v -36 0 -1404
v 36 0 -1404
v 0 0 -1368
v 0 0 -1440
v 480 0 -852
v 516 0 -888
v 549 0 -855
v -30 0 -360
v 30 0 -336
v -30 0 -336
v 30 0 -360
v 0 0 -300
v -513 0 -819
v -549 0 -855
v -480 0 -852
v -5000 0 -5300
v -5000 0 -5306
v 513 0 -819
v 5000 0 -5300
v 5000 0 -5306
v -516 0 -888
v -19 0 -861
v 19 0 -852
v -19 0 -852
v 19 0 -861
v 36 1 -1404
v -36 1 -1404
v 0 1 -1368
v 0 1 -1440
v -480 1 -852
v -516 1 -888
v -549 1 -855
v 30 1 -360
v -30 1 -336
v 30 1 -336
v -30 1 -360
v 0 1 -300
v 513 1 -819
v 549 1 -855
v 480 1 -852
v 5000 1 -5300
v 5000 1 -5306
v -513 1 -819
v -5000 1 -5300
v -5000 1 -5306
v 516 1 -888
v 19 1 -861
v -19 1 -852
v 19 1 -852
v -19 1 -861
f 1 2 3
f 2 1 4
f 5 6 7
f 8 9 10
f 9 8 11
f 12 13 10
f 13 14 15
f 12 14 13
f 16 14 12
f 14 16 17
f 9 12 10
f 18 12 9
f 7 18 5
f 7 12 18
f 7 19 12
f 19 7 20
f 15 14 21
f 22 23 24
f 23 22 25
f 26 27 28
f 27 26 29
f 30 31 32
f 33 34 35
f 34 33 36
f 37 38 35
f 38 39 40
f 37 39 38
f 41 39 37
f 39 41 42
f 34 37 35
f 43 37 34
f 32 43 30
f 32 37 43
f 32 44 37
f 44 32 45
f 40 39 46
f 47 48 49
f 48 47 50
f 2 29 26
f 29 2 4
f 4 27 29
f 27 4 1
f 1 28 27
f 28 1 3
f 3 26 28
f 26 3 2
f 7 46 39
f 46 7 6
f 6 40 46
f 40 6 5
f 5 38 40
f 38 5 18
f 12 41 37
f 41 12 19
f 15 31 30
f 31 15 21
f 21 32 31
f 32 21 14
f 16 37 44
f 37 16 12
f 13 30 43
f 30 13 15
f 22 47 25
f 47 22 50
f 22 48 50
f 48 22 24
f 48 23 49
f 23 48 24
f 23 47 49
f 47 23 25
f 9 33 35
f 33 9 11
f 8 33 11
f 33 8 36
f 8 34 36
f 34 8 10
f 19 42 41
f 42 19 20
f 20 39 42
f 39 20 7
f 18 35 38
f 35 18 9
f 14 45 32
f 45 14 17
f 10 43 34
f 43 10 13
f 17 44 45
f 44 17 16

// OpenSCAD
$fs = 120;

$vpt = [0,1080,480];
$vpr = [-34,0,0];
$vpf = 45;

foul_line = 6;
plain_color = [1,1,1,0.8];
out_color = [1,0.75,0.75,0.8];
eat_color = [0.5,0.75,1,0.8];

// home, first, second, third, rubber
color([1,1,1]) scale([1,-1,-1]) rotate([90,0,0]) linear_extrude(1) {
    polygon([[-30,30*2+300],[30,30*2+300],[30,30+300],[0,300],[-30,30+300]]);
    polygon([[552-36*2,852],[552-36,852+36],[552,852],[552-36,852-36]]);
    polygon([[0,1404+36],[36,1404],[0,1404-36],[-36,1404]]);
    polygon([[-552+36*2,852],[-552+36,852+36],[-552,852],[-552+36,852-36]]);
    polygon([[-19,852],[19,852],[19,9+852],[-19,9+852]]);
}

// foul lines
color([1,1,1,0.5]) scale([1,-1,-1]) rotate([90,0,0]) linear_extrude(1) {
    polygon([[0,300],[-5000,300+5000],[-5000,300+5000+foul_line],[0,300+foul_line]]);
    polygon([[0,300],[5000,300+5000],[5000,300+5000+foul_line],[0,300+foul_line]]);
}

scale([0.1,0.1,-0.1]) translate([-23200,0,0]) {
    color(out_color) polyhedron([[12390,0,8700],[12400,0,8700],[12390,1350,8700],[12400,1350,8700]], [[0,1,3,2]]);
    color(out_color) polyhedron([[12390,0,8700],[12390,0,21700],[12390,1350,8700],[12390,1350,21700]], [[0,1,3,2]]);
    color(out_color) polyhedron([[12400,0,8700],[12400,0,21700],[12400,1350,8700],[12400,1350,21700]], [[0,1,3,2]]);
    color(out_color) polyhedron([[12390,0,21700],[12400,0,21700],[12390,1350,21700],[12400,1350,21700]], [[0,1,3,2]]);
    color(out_color) polyhedron([[12390,1350,8700],[12390,1350,21700],[12400,1350,8700],[12400,1350,21700]], [[0,1,3,2]]);
    color(out_color) polyhedron([[12400,0,21680],[22300,0,31450],[12400,1350,21680],[22300,1350,31450]], [[0,1,3,2]]);
    color(out_color) polyhedron([[12400,0,21680],[12400,0,21690],[12400,1350,21680],[12400,1350,21690]], [[0,1,3,2]]);
    color(out_color) polyhedron([[22300,0,31450],[22300,0,31460],[22300,1350,31450],[22300,1350,31460]], [[0,1,3,2]]);
    color(out_color) polyhedron([[12400,0,21690],[22300,0,31460],[12400,1350,21690],[22300,1350,31460]], [[0,1,3,2]]);
    color(out_color) polyhedron([[12400,1350,21680],[12400,1350,21690],[22300,1350,31450],[22300,1350,31460]], [[0,1,3,2]]);
    color(out_color) polyhedron([[14250,0,39418],[40000,0,13931],[14250,4150,39418],[40000,4150,13931]], [[0,1,3,2]]);
    color(out_color) polyhedron([[14250,0,39418],[14250,0,39428],[14250,4150,39418],[14250,4150,39428]], [[0,1,3,2]]);
    color(out_color) polyhedron([[40000,0,13931],[40000,0,13941],[40000,4150,13931],[40000,4150,13941]], [[0,1,3,2]]);
    color(out_color) polyhedron([[14250,0,39428],[40000,0,13941],[14250,4150,39428],[40000,4150,13941]], [[0,1,3,2]]);
    color(out_color) polyhedron([[14250,4150,39418],[14250,4150,39428],[40000,4150,13931],[40000,4150,13941]], [[0,1,3,2]]);
    color(out_color) polyhedron([[33700,0,25800],[42200,0,16660],[33700,1700,25800],[42200,1700,16660]], [[0,1,3,2]]);
    color(out_color) polyhedron([[33700,0,25800],[35700,0,28600],[33700,1700,25800],[35700,1700,28600]], [[0,1,3,2]]);
    color(out_color) polyhedron([[42200,0,16660],[42200,0,18610],[42200,1700,16660],[42200,1700,18610]], [[0,1,3,2]]);
    color(out_color) polyhedron([[35700,0,28600],[42200,0,18610],[35700,1700,28600],[42200,1700,18610]], [[0,1,3,2]]);
    color(out_color) polyhedron([[33700,1700,25800],[35700,1700,28600],[42200,1700,16660],[42200,1700,18610]], [[0,1,3,2]]);
    color(out_color) polyhedron([[24730,0,1930],[24731,0,1930],[24730,10,1930],[24731,10,1930]], [[0,1,3,2]]);
    color(out_color) polyhedron([[24730,0,1930],[36050,0,14510],[24730,10,1930],[36050,10,14510]], [[0,1,3,2]]);
    color(out_color) polyhedron([[24731,0,1930],[36051,0,14510],[24731,10,1930],[36051,10,14510]], [[0,1,3,2]]);
    color(out_color) polyhedron([[36050,0,14510],[36051,0,14510],[36050,10,14510],[36051,10,14510]], [[0,1,3,2]]);
    color(out_color) polyhedron([[24730,10,1930],[36050,10,14510],[24731,10,1930],[36051,10,14510]], [[0,1,3,2]]);
    color(out_color) polyhedron([[13960,0,4590],[18500,0,4590],[13960,5,4590],[18500,5,4590]], [[0,1,3,2]]);
    color(out_color) polyhedron([[13960,0,4590],[13960,0,4690],[13960,5,4590],[13960,5,4690]], [[0,1,3,2]]);
    color(out_color) polyhedron([[18500,0,4590],[18500,0,4690],[18500,5,4590],[18500,5,4690]], [[0,1,3,2]]);
    color(out_color) polyhedron([[13960,0,4690],[18500,0,4690],[13960,5,4690],[18500,5,4690]], [[0,1,3,2]]);
    color(out_color) polyhedron([[13960,5,4590],[13960,5,4690],[18500,5,4590],[18500,5,4690]], [[0,1,3,2]]);
    color(out_color) polyhedron([[19090,0,1880],[19190,0,1880],[19090,5,1880],[19190,5,1880]], [[0,1,3,2]]);
    color(out_color) polyhedron([[19090,0,1880],[18500,0,4560],[19090,5,1880],[18500,5,4560]], [[0,1,3,2]]);
    color(out_color) polyhedron([[19190,0,1880],[18600,0,4560],[19190,5,1880],[18600,5,4560]], [[0,1,3,2]]);
    color(out_color) polyhedron([[18500,0,4560],[18600,0,4560],[18500,5,4560],[18600,5,4560]], [[0,1,3,2]]);
    color(out_color) polyhedron([[19090,5,1880],[18500,5,4560],[19190,5,1880],[18600,5,4560]], [[0,1,3,2]]);
    color(plain_color) polyhedron([[0,0,0],[0,0,0],[0,0,0],[0,0,0]], [[0,1,3,2]]);
    color(plain_color) polyhedron([[0,0,0],[0,0,0],[0,0,0],[0,0,0]], [[0,1,3,2]]);
    color(plain_color) polyhedron([[0,0,0],[0,0,0],[0,0,0],[0,0,0]], [[0,1,3,2]]);
    color(plain_color) polyhedron([[0,0,0],[0,0,0],[0,0,0],[0,0,0]], [[0,1,3,2]]);
    color(plain_color) polyhedron([[0,0,0],[0,0,0],[0,0,0],[0,0,0]], [[0,1,3,2]]);
    color(plain_color) polyhedron([[0,0,0],[0,0,0],[0,0,0],[0,0,0]], [[0,1,3,2]]);
    color(plain_color) polyhedron([[0,0,0],[0,0,0],[0,0,0],[0,0,0]], [[0,1,3,2]]);
    color(plain_color) polyhedron([[0,0,0],[0,0,0],[0,0,0],[0,0,0]], [[0,1,3,2]]);
    color(plain_color) polyhedron([[0,0,0],[0,0,0],[0,0,0],[0,0,0]], [[0,1,3,2]]);
    color(plain_color) polyhedron([[0,0,0],[0,0,0],[0,0,0],[0,0,0]], [[0,1,3,2]]);
    color(plain_color) polyhedron([[0,0,0],[0,0,0],[0,0,0],[0,0,0]], [[0,1,3,2]]);
    color(plain_color) polyhedron([[0,0,0],[0,0,0],[0,0,0],[0,0,0]], [[0,1,3,2]]);
    color(plain_color) polyhedron([[0,0,0],[0,0,0],[0,0,0],[0,0,0]], [[0,1,3,2]]);
    color(plain_color) polyhedron([[0,0,0],[0,0,0],[0,0,0],[0,0,0]], [[0,1,3,2]]);
    color(plain_color) polyhedron([[0,0,0],[0,0,0],[0,0,0],[0,0,0]], [[0,1,3,2]]);
    color(plain_color) polyhedron([[0,0,0],[0,0,0],[0,0,0],[0,0,0]], [[0,1,3,2]]);
    color(plain_color) polyhedron([[0,0,0],[0,0,0],[0,0,0],[0,0,0]], [[0,1,3,2]]);
    color(plain_color) polyhedron([[0,0,0],[0,0,0],[0,0,0],[0,0,0]], [[0,1,3,2]]);
    color(plain_color) polyhedron([[0,0,0],[0,0,0],[0,0,0],[0,0,0]], [[0,1,3,2]]);
    color(plain_color) polyhedron([[0,0,0],[0,0,0],[0,0,0],[0,0,0]], [[0,1,3,2]]);
    color(plain_color) polyhedron([[0,0,0],[0,0,0],[0,0,0],[0,0,0]], [[0,1,3,2]]);
    color(plain_color) polyhedron([[0,0,0],[0,0,0],[0,0,0],[0,0,0]], [[0,1,3,2]]);
    color(plain_color) polyhedron([[0,0,0],[0,0,0],[0,0,0],[0,0,0]], [[0,1,3,2]]);
    color(plain_color) polyhedron([[0,0,0],[0,0,0],[0,0,0],[0,0,0]], [[0,1,3,2]]);
    color(plain_color) polyhedron([[0,0,0],[0,0,0],[0,0,0],[0,0,0]], [[0,1,3,2]]);
    color(plain_color) polyhedron([[0,0,0],[0,0,0],[0,0,0],[0,0,0]], [[0,1,3,2]]);
    color(plain_color) polyhedron([[0,0,0],[0,0,0],[0,0,0],[0,0,0]], [[0,1,3,2]]);
    color(plain_color) polyhedron([[0,0,0],[0,0,0],[0,0,0],[0,0,0]], [[0,1,3,2]]);
    color(plain_color) polyhedron([[0,0,0],[0,0,0],[0,0,0],[0,0,0]], [[0,1,3,2]]);
    color(plain_color) polyhedron([[0,0,0],[0,0,0],[0,0,0],[0,0,0]], [[0,1,3,2]]);
    color(plain_color) polyhedron([[0,0,0],[0,0,0],[0,0,0],[0,0,0]], [[0,1,3,2]]);
    color(plain_color) polyhedron([[0,0,0],[0,0,0],[0,0,0],[0,0,0]], [[0,1,3,2]]);
    color(plain_color) polyhedron([[0,0,0],[0,0,0],[0,0,0],[0,0,0]], [[0,1,3,2]]);
    color(plain_color) polyhedron([[0,0,0],[0,0,0],[0,0,0],[0,0,0]], [[0,1,3,2]]);
    color(plain_color) polyhedron([[0,0,0],[0,0,0],[0,0,0],[0,0,0]], [[0,1,3,2]]);
    color(plain_color) polyhedron([[0,0,0],[0,0,0],[0,0,0],[0,0,0]], [[0,1,3,2]]);
    color(plain_color) polyhedron([[0,0,0],[0,0,0],[0,0,0],[0,0,0]], [[0,1,3,2]]);
    color(plain_color) polyhedron([[0,0,0],[0,0,0],[0,0,0],[0,0,0]], [[0,1,3,2]]);
    color(plain_color) polyhedron([[0,0,0],[0,0,0],[0,0,0],[0,0,0]], [[0,1,3,2]]);
    color(plain_color) polyhedron([[0,0,0],[0,0,0],[0,0,0],[0,0,0]], [[0,1,3,2]]);
    color(plain_color) polyhedron([[0,0,0],[0,0,0],[0,0,0],[0,0,0]], [[0,1,3,2]]);
    color(plain_color) polyhedron([[0,0,0],[0,0,0],[0,0,0],[0,0,0]], [[0,1,3,2]]);
    color(plain_color) polyhedron([[0,0,0],[0,0,0],[0,0,0],[0,0,0]], [[0,1,3,2]]);
    color(plain_color) polyhedron([[0,0,0],[0,0,0],[0,0,0],[0,0,0]], [[0,1,3,2]]);
    color(plain_color) polyhedron([[0,0,0],[0,0,0],[0,0,0],[0,0,0]], [[0,1,3,2]]);
    color(plain_color) polyhedron([[0,0,0],[0,0,0],[0,0,0],[0,0,0]], [[0,1,3,2]]);
    color(plain_color) polyhedron([[0,0,0],[0,0,0],[0,0,0],[0,0,0]], [[0,1,3,2]]);
    color(plain_color) polyhedron([[0,0,0],[0,0,0],[0,0,0],[0,0,0]], [[0,1,3,2]]);
    color(plain_color) polyhedron([[0,0,0],[0,0,0],[0,0,0],[0,0,0]], [[0,1,3,2]]);
    color(plain_color) polyhedron([[0,0,0],[0,0,0],[0,0,0],[0,0,0]], [[0,1,3,2]]);
    color(plain_color) polyhedron([[0,0,0],[0,0,0],[0,0,0],[0,0,0]], [[0,1,3,2]]);
    color(plain_color) polyhedron([[0,0,0],[0,0,0],[0,0,0],[0,0,0]], [[0,1,3,2]]);
    color(plain_color) polyhedron([[0,0,0],[0,0,0],[0,0,0],[0,0,0]], [[0,1,3,2]]);
    color(plain_color) polyhedron([[0,0,0],[0,0,0],[0,0,0],[0,0,0]], [[0,1,3,2]]);
    color(plain_color) polyhedron([[0,0,0],[0,0,0],[0,0,0],[0,0,0]], [[0,1,3,2]]);
    color(plain_color) polyhedron([[0,0,0],[0,0,0],[0,0,0],[0,0,0]], [[0,1,3,2]]);
    color(plain_color) polyhedron([[0,0,0],[0,0,0],[0,0,0],[0,0,0]], [[0,1,3,2]]);
    color(plain_color) polyhedron([[0,0,0],[0,0,0],[0,0,0],[0,0,0]], [[0,1,3,2]]);
    color(plain_color) polyhedron([[0,0,0],[0,0,0],[0,0,0],[0,0,0]], [[0,1,3,2]]);
    color(plain_color) polyhedron([[0,0,0],[0,0,0],[0,0,0],[0,0,0]], [[0,1,3,2]]);
    color(plain_color) polyhedron([[0,0,0],[0,0,0],[0,0,0],[0,0,0]], [[0,1,3,2]]);
    color(plain_color) polyhedron([[0,0,0],[0,0,0],[0,0,0],[0,0,0]], [[0,1,3,2]]);
    color(plain_color) polyhedron([[0,0,0],[0,0,0],[0,0,0],[0,0,0]], [[0,1,3,2]]);
    color(plain_color) polyhedron([[0,0,0],[0,0,0],[0,0,0],[0,0,0]], [[0,1,3,2]]);
    color(plain_color) polyhedron([[0,0,0],[0,0,0],[0,0,0],[0,0,0]], [[0,1,3,2]]);
    color(plain_color) polyhedron([[0,0,0],[0,0,0],[0,0,0],[0,0,0]], [[0,1,3,2]]);
    color(plain_color) polyhedron([[0,0,0],[0,0,0],[0,0,0],[0,0,0]], [[0,1,3,2]]);
    color(plain_color) polyhedron([[0,0,0],[0,0,0],[0,0,0],[0,0,0]], [[0,1,3,2]]);
    color(plain_color) polyhedron([[0,0,0],[0,0,0],[0,0,0],[0,0,0]], [[0,1,3,2]]);
    color(plain_color) polyhedron([[0,0,0],[0,0,0],[0,0,0],[0,0,0]], [[0,1,3,2]]);
    color(plain_color) polyhedron([[0,0,0],[0,0,0],[0,0,0],[0,0,0]], [[0,1,3,2]]);
    color(plain_color) polyhedron([[0,0,0],[0,0,0],[0,0,0],[0,0,0]], [[0,1,3,2]]);
    color(plain_color) polyhedron([[0,0,0],[0,0,0],[0,0,0],[0,0,0]], [[0,1,3,2]]);
    color(plain_color) polyhedron([[0,0,0],[0,0,0],[0,0,0],[0,0,0]], [[0,1,3,2]]);
    color(plain_color) polyhedron([[0,0,0],[0,0,0],[0,0,0],[0,0,0]], [[0,1,3,2]]);
    color(plain_color) polyhedron([[0,0,0],[0,0,0],[0,0,0],[0,0,0]], [[0,1,3,2]]);
    color(plain_color) polyhedron([[0,0,0],[0,0,0],[0,0,0],[0,0,0]], [[0,1,3,2]]);
    color(plain_color) polyhedron([[0,0,0],[0,0,0],[0,0,0],[0,0,0]], [[0,1,3,2]]);
    color(plain_color) polyhedron([[0,0,0],[0,0,0],[0,0,0],[0,0,0]], [[0,1,3,2]]);
    color(plain_color) polyhedron([[0,0,0],[0,0,0],[0,0,0],[0,0,0]], [[0,1,3,2]]);
    color(plain_color) polyhedron([[0,0,0],[0,0,0],[0,0,0],[0,0,0]], [[0,1,3,2]]);
    color(plain_color) polyhedron([[0,0,0],[0,0,0],[0,0,0],[0,0,0]], [[0,1,3,2]]);
    color(plain_color) polyhedron([[0,0,0],[0,0,0],[0,0,0],[0,0,0]], [[0,1,3,2]]);
    color(plain_color) polyhedron([[0,0,0],[0,0,0],[0,0,0],[0,0,0]], [[0,1,3,2]]);
    color(plain_color) polyhedron([[0,0,0],[0,0,0],[0,0,0],[0,0,0]], [[0,1,3,2]]);
    color(plain_color) polyhedron([[0,0,0],[0,0,0],[0,0,0],[0,0,0]], [[0,1,3,2]]);
    color(plain_color) polyhedron([[0,0,0],[0,0,0],[0,0,0],[0,0,0]], [[0,1,3,2]]);
    color(plain_color) polyhedron([[0,0,0],[0,0,0],[0,0,0],[0,0,0]], [[0,1,3,2]]);
    color(plain_color) polyhedron([[0,0,0],[0,0,0],[0,0,0],[0,0,0]], [[0,1,3,2]]);
    color(plain_color) polyhedron([[0,0,0],[0,0,0],[0,0,0],[0,0,0]], [[0,1,3,2]]);
    color(plain_color) polyhedron([[0,0,0],[0,0,0],[0,0,0],[0,0,0]], [[0,1,3,2]]);
    color(plain_color) polyhedron([[0,0,0],[0,0,0],[0,0,0],[0,0,0]], [[0,1,3,2]]);
    color(plain_color) polyhedron([[0,0,0],[0,0,0],[0,0,0],[0,0,0]], [[0,1,3,2]]);
    color(plain_color) polyhedron([[0,0,0],[0,0,0],[0,0,0],[0,0,0]], [[0,1,3,2]]);
    color(plain_color) polyhedron([[0,0,0],[0,0,0],[0,0,0],[0,0,0]], [[0,1,3,2]]);
    color(plain_color) polyhedron([[0,0,0],[0,0,0],[0,0,0],[0,0,0]], [[0,1,3,2]]);
    color(plain_color) polyhedron([[0,0,0],[0,0,0],[0,0,0],[0,0,0]], [[0,1,3,2]]);
    color(plain_color) polyhedron([[0,0,0],[0,0,0],[0,0,0],[0,0,0]], [[0,1,3,2]]);
    color(plain_color) polyhedron([[0,0,0],[0,0,0],[0,0,0],[0,0,0]], [[0,1,3,2]]);
    color(plain_color) polyhedron([[0,0,0],[0,0,0],[0,0,0],[0,0,0]], [[0,1,3,2]]);
    color(plain_color) polyhedron([[0,0,0],[0,0,0],[0,0,0],[0,0,0]], [[0,1,3,2]]);
    color(plain_color) polyhedron([[0,0,0],[0,0,0],[0,0,0],[0,0,0]], [[0,1,3,2]]);
    color(plain_color) polyhedron([[0,0,0],[0,0,0],[0,0,0],[0,0,0]], [[0,1,3,2]]);
    color(plain_color) polyhedron([[0,0,0],[0,0,0],[0,0,0],[0,0,0]], [[0,1,3,2]]);
    color(plain_color) polyhedron([[0,0,0],[0,0,0],[0,0,0],[0,0,0]], [[0,1,3,2]]);
    color(plain_color) polyhedron([[0,0,0],[0,0,0],[0,0,0],[0,0,0]], [[0,1,3,2]]);
    color(plain_color) polyhedron([[0,0,0],[0,0,0],[0,0,0],[0,0,0]], [[0,1,3,2]]);
    color(plain_color) polyhedron([[0,0,0],[0,0,0],[0,0,0],[0,0,0]], [[0,1,3,2]]);
    color(plain_color) polyhedron([[0,0,0],[0,0,0],[0,0,0],[0,0,0]], [[0,1,3,2]]);
    color(plain_color) polyhedron([[0,0,0],[0,0,0],[0,0,0],[0,0,0]], [[0,1,3,2]]);
    color(plain_color) polyhedron([[0,0,0],[0,0,0],[0,0,0],[0,0,0]], [[0,1,3,2]]);
    color(plain_color) polyhedron([[0,0,0],[0,0,0],[0,0,0],[0,0,0]], [[0,1,3,2]]);
    color(plain_color) polyhedron([[0,0,0],[0,0,0],[0,0,0],[0,0,0]], [[0,1,3,2]]);
    color(plain_color) polyhedron([[0,0,0],[0,0,0],[0,0,0],[0,0,0]], [[0,1,3,2]]);
    color(plain_color) polyhedron([[0,0,0],[0,0,0],[0,0,0],[0,0,0]], [[0,1,3,2]]);
    color(plain_color) polyhedron([[0,0,0],[0,0,0],[0,0,0],[0,0,0]], [[0,1,3,2]]);
    color(plain_color) polyhedron([[0,0,0],[0,0,0],[0,0,0],[0,0,0]], [[0,1,3,2]]);
    color(plain_color) polyhedron([[0,0,0],[0,0,0],[0,0,0],[0,0,0]], [[0,1,3,2]]);
    color(plain_color) polyhedron([[0,0,0],[0,0,0],[0,0,0],[0,0,0]], [[0,1,3,2]]);
    color(plain_color) polyhedron([[0,0,0],[0,0,0],[0,0,0],[0,0,0]], [[0,1,3,2]]);
    color(plain_color) polyhedron([[0,0,0],[0,0,0],[0,0,0],[0,0,0]], [[0,1,3,2]]);
    color(plain_color) polyhedron([[0,0,0],[0,0,0],[0,0,0],[0,0,0]], [[0,1,3,2]]);
    color(plain_color) polyhedron([[0,0,0],[0,0,0],[0,0,0],[0,0,0]], [[0,1,3,2]]);
    color(plain_color) polyhedron([[0,0,0],[0,0,0],[0,0,0],[0,0,0]], [[0,1,3,2]]);
    color(plain_color) polyhedron([[0,0,0],[0,0,0],[0,0,0],[0,0,0]], [[0,1,3,2]]);
    color(plain_color) polyhedron([[0,0,0],[0,0,0],[0,0,0],[0,0,0]], [[0,1,3,2]]);
    color(plain_color) polyhedron([[0,0,0],[0,0,0],[0,0,0],[0,0,0]], [[0,1,3,2]]);
    color(plain_color) polyhedron([[0,0,0],[0,0,0],[0,0,0],[0,0,0]], [[0,1,3,2]]);
    color(plain_color) polyhedron([[0,0,0],[0,0,0],[0,0,0],[0,0,0]], [[0,1,3,2]]);
    color(plain_color) polyhedron([[0,0,0],[0,0,0],[0,0,0],[0,0,0]], [[0,1,3,2]]);
    color(plain_color) polyhedron([[0,0,0],[0,0,0],[0,0,0],[0,0,0]], [[0,1,3,2]]);
    color(plain_color) polyhedron([[0,0,0],[0,0,0],[0,0,0],[0,0,0]], [[0,1,3,2]]);
    color(plain_color) polyhedron([[0,0,0],[0,0,0],[0,0,0],[0,0,0]], [[0,1,3,2]]);
    color(plain_color) polyhedron([[0,0,0],[0,0,0],[0,0,0],[0,0,0]], [[0,1,3,2]]);
    color(plain_color) polyhedron([[0,0,0],[0,0,0],[0,0,0],[0,0,0]], [[0,1,3,2]]);
    color(plain_color) polyhedron([[0,0,0],[0,0,0],[0,0,0],[0,0,0]], [[0,1,3,2]]);
    color(plain_color) polyhedron([[0,0,0],[0,0,0],[0,0,0],[0,0,0]], [[0,1,3,2]]);
    color(plain_color) polyhedron([[0,0,0],[0,0,0],[0,0,0],[0,0,0]], [[0,1,3,2]]);
    color(plain_color) polyhedron([[0,0,0],[0,0,0],[0,0,0],[0,0,0]], [[0,1,3,2]]);
    color(plain_color) polyhedron([[0,0,0],[0,0,0],[0,0,0],[0,0,0]], [[0,1,3,2]]);
    color(plain_color) polyhedron([[0,0,0],[0,0,0],[0,0,0],[0,0,0]], [[0,1,3,2]]);
    color(plain_color) polyhedron([[0,0,0],[0,0,0],[0,0,0],[0,0,0]], [[0,1,3,2]]);
    color(plain_color) polyhedron([[0,0,0],[0,0,0],[0,0,0],[0,0,0]], [[0,1,3,2]]);
    color(plain_color) polyhedron([[0,0,0],[0,0,0],[0,0,0],[0,0,0]], [[0,1,3,2]]);
    color(plain_color) polyhedron([[0,0,0],[0,0,0],[0,0,0],[0,0,0]], [[0,1,3,2]]);
    color(plain_color) polyhedron([[0,0,0],[0,0,0],[0,0,0],[0,0,0]], [[0,1,3,2]]);
    color(plain_color) polyhedron([[0,0,0],[0,0,0],[0,0,0],[0,0,0]], [[0,1,3,2]]);
    color(plain_color) polyhedron([[0,0,0],[0,0,0],[0,0,0],[0,0,0]], [[0,1,3,2]]);
    color(plain_color) polyhedron([[0,0,0],[0,0,0],[0,0,0],[0,0,0]], [[0,1,3,2]]);
    color(plain_color) polyhedron([[0,0,0],[0,0,0],[0,0,0],[0,0,0]], [[0,1,3,2]]);
    color(plain_color) polyhedron([[0,0,0],[0,0,0],[0,0,0],[0,0,0]], [[0,1,3,2]]);
    color(plain_color) polyhedron([[0,0,0],[0,0,0],[0,0,0],[0,0,0]], [[0,1,3,2]]);
    color(plain_color) polyhedron([[0,0,0],[0,0,0],[0,0,0],[0,0,0]], [[0,1,3,2]]);
    color(plain_color) polyhedron([[0,0,0],[0,0,0],[0,0,0],[0,0,0]], [[0,1,3,2]]);
    color(plain_color) polyhedron([[0,0,0],[0,0,0],[0,0,0],[0,0,0]], [[0,1,3,2]]);
    color(plain_color) polyhedron([[0,0,0],[0,0,0],[0,0,0],[0,0,0]], [[0,1,3,2]]);
    color(plain_color) polyhedron([[0,0,0],[0,0,0],[0,0,0],[0,0,0]], [[0,1,3,2]]);
    color(plain_color) polyhedron([[0,0,0],[0,0,0],[0,0,0],[0,0,0]], [[0,1,3,2]]);
    color(plain_color) polyhedron([[0,0,0],[0,0,0],[0,0,0],[0,0,0]], [[0,1,3,2]]);
    color(plain_color) polyhedron([[0,0,0],[0,0,0],[0,0,0],[0,0,0]], [[0,1,3,2]]);
    color(plain_color) polyhedron([[0,0,0],[0,0,0],[0,0,0],[0,0,0]], [[0,1,3,2]]);
    color(plain_color) polyhedron([[0,0,0],[0,0,0],[0,0,0],[0,0,0]], [[0,1,3,2]]);
    color(plain_color) polyhedron([[0,0,0],[0,0,0],[0,0,0],[0,0,0]], [[0,1,3,2]]);
    color(plain_color) polyhedron([[0,0,0],[0,0,0],[0,0,0],[0,0,0]], [[0,1,3,2]]);
    color(plain_color) polyhedron([[0,0,0],[0,0,0],[0,0,0],[0,0,0]], [[0,1,3,2]]);
    color(plain_color) polyhedron([[0,0,0],[0,0,0],[0,0,0],[0,0,0]], [[0,1,3,2]]);
    color(plain_color) polyhedron([[0,0,0],[0,0,0],[0,0,0],[0,0,0]], [[0,1,3,2]]);
    color(plain_color) polyhedron([[0,0,0],[0,0,0],[0,0,0],[0,0,0]], [[0,1,3,2]]);
    color(plain_color) polyhedron([[0,0,0],[0,0,0],[0,0,0],[0,0,0]], [[0,1,3,2]]);
    color(plain_color) polyhedron([[0,0,0],[0,0,0],[0,0,0],[0,0,0]], [[0,1,3,2]]);
    color(plain_color) polyhedron([[0,0,0],[0,0,0],[0,0,0],[0,0,0]], [[0,1,3,2]]);
    color(plain_color) polyhedron([[0,0,0],[0,0,0],[0,0,0],[0,0,0]], [[0,1,3,2]]);
    color(plain_color) polyhedron([[0,0,0],[0,0,0],[0,0,0],[0,0,0]], [[0,1,3,2]]);
    color(plain_color) polyhedron([[0,0,0],[0,0,0],[0,0,0],[0,0,0]], [[0,1,3,2]]);
    color(plain_color) polyhedron([[0,0,0],[0,0,0],[0,0,0],[0,0,0]], [[0,1,3,2]]);
    color(plain_color) polyhedron([[0,0,0],[0,0,0],[0,0,0],[0,0,0]], [[0,1,3,2]]);
    color(plain_color) polyhedron([[0,0,0],[0,0,0],[0,0,0],[0,0,0]], [[0,1,3,2]]);
    color(plain_color) polyhedron([[0,0,0],[0,0,0],[0,0,0],[0,0,0]], [[0,1,3,2]]);
    color(plain_color) polyhedron([[0,0,0],[0,0,0],[0,0,0],[0,0,0]], [[0,1,3,2]]);
    color(plain_color) polyhedron([[0,0,0],[0,0,0],[0,0,0],[0,0,0]], [[0,1,3,2]]);
    color(plain_color) polyhedron([[0,0,0],[0,0,0],[0,0,0],[0,0,0]], [[0,1,3,2]]);
    color(plain_color) polyhedron([[0,0,0],[0,0,0],[0,0,0],[0,0,0]], [[0,1,3,2]]);
    color(plain_color) polyhedron([[0,0,0],[0,0,0],[0,0,0],[0,0,0]], [[0,1,3,2]]);
    color(plain_color) polyhedron([[0,0,0],[0,0,0],[0,0,0],[0,0,0]], [[0,1,3,2]]);
    color(plain_color) polyhedron([[0,0,0],[0,0,0],[0,0,0],[0,0,0]], [[0,1,3,2]]);
    color(plain_color) polyhedron([[0,0,0],[0,0,0],[0,0,0],[0,0,0]], [[0,1,3,2]]);
    color(plain_color) polyhedron([[0,0,0],[0,0,0],[0,0,0],[0,0,0]], [[0,1,3,2]]);
    color(plain_color) polyhedron([[0,0,0],[0,0,0],[0,0,0],[0,0,0]], [[0,1,3,2]]);
    color(plain_color) polyhedron([[0,0,0],[0,0,0],[0,0,0],[0,0,0]], [[0,1,3,2]]);
    color(plain_color) polyhedron([[0,0,0],[0,0,0],[0,0,0],[0,0,0]], [[0,1,3,2]]);
    color(plain_color) polyhedron([[0,0,0],[0,0,0],[0,0,0],[0,0,0]], [[0,1,3,2]]);
    color(plain_color) polyhedron([[0,0,0],[0,0,0],[0,0,0],[0,0,0]], [[0,1,3,2]]);
    color(plain_color) polyhedron([[0,0,0],[0,0,0],[0,0,0],[0,0,0]], [[0,1,3,2]]);
    color(plain_color) polyhedron([[0,0,0],[0,0,0],[0,0,0],[0,0,0]], [[0,1,3,2]]);
    color(plain_color) polyhedron([[0,0,0],[0,0,0],[0,0,0],[0,0,0]], [[0,1,3,2]]);
    color(plain_color) polyhedron([[0,0,0],[0,0,0],[0,0,0],[0,0,0]], [[0,1,3,2]]);
    color(plain_color) polyhedron([[0,0,0],[0,0,0],[0,0,0],[0,0,0]], [[0,1,3,2]]);
    color(plain_color) polyhedron([[0,0,0],[0,0,0],[0,0,0],[0,0,0]], [[0,1,3,2]]);
    color(plain_color) polyhedron([[0,0,0],[0,0,0],[0,0,0],[0,0,0]], [[0,1,3,2]]);
    color(plain_color) polyhedron([[0,0,0],[0,0,0],[0,0,0],[0,0,0]], [[0,1,3,2]]);
    color(plain_color) polyhedron([[0,0,0],[0,0,0],[0,0,0],[0,0,0]], [[0,1,3,2]]);
    color(plain_color) polyhedron([[0,0,0],[0,0,0],[0,0,0],[0,0,0]], [[0,1,3,2]]);
    color(plain_color) polyhedron([[0,0,0],[0,0,0],[0,0,0],[0,0,0]], [[0,1,3,2]]);
    color(plain_color) polyhedron([[0,0,0],[0,0,0],[0,0,0],[0,0,0]], [[0,1,3,2]]);
    color(plain_color) polyhedron([[0,0,0],[0,0,0],[0,0,0],[0,0,0]], [[0,1,3,2]]);
    color(plain_color) polyhedron([[0,0,0],[0,0,0],[0,0,0],[0,0,0]], [[0,1,3,2]]);
    color(plain_color) polyhedron([[0,0,0],[0,0,0],[0,0,0],[0,0,0]], [[0,1,3,2]]);
    color(plain_color) polyhedron([[0,0,0],[0,0,0],[0,0,0],[0,0,0]], [[0,1,3,2]]);
    color(plain_color) polyhedron([[0,0,0],[0,0,0],[0,0,0],[0,0,0]], [[0,1,3,2]]);
    color(plain_color) polyhedron([[0,0,0],[0,0,0],[0,0,0],[0,0,0]], [[0,1,3,2]]);
    color(plain_color) polyhedron([[0,0,0],[0,0,0],[0,0,0],[0,0,0]], [[0,1,3,2]]);
    color(plain_color) polyhedron([[0,0,0],[0,0,0],[0,0,0],[0,0,0]], [[0,1,3,2]]);
    color(plain_color) polyhedron([[0,0,0],[0,0,0],[0,0,0],[0,0,0]], [[0,1,3,2]]);
    color(plain_color) polyhedron([[0,0,0],[0,0,0],[0,0,0],[0,0,0]], [[0,1,3,2]]);
    color(plain_color) polyhedron([[0,0,0],[0,0,0],[0,0,0],[0,0,0]], [[0,1,3,2]]);
    color(plain_color) polyhedron([[0,0,0],[0,0,0],[0,0,0],[0,0,0]], [[0,1,3,2]]);
    color(plain_color) polyhedron([[0,0,0],[0,0,0],[0,0,0],[0,0,0]], [[0,1,3,2]]);
    color(plain_color) polyhedron([[0,0,0],[0,0,0],[0,0,0],[0,0,0]], [[0,1,3,2]]);
    color(plain_color) polyhedron([[0,0,0],[0,0,0],[0,0,0],[0,0,0]], [[0,1,3,2]]);
    color(plain_color) polyhedron([[0,0,0],[0,0,0],[0,0,0],[0,0,0]], [[0,1,3,2]]);
    color(plain_color) polyhedron([[0,0,0],[0,0,0],[0,0,0],[0,0,0]], [[0,1,3,2]]);
    color(plain_color) polyhedron([[0,0,0],[0,0,0],[0,0,0],[0,0,0]], [[0,1,3,2]]);
    color(plain_color) polyhedron([[0,0,0],[0,0,0],[0,0,0],[0,0,0]], [[0,1,3,2]]);
    color(plain_color) polyhedron([[0,0,0],[0,0,0],[0,0,0],[0,0,0]], [[0,1,3,2]]);
    color(plain_color) polyhedron([[0,0,0],[0,0,0],[0,0,0],[0,0,0]], [[0,1,3,2]]);
    color(plain_color) polyhedron([[0,0,0],[0,0,0],[0,0,0],[0,0,0]], [[0,1,3,2]]);
    color(plain_color) polyhedron([[0,0,0],[0,0,0],[0,0,0],[0,0,0]], [[0,1,3,2]]);
    color(plain_color) polyhedron([[0,0,0],[0,0,0],[0,0,0],[0,0,0]], [[0,1,3,2]]);
    color(plain_color) polyhedron([[0,0,0],[0,0,0],[0,0,0],[0,0,0]], [[0,1,3,2]]);
    color(plain_color) polyhedron([[0,0,0],[0,0,0],[0,0,0],[0,0,0]], [[0,1,3,2]]);
    color(plain_color) polyhedron([[0,0,0],[0,0,0],[0,0,0],[0,0,0]], [[0,1,3,2]]);
    color(plain_color) polyhedron([[0,0,0],[0,0,0],[0,0,0],[0,0,0]], [[0,1,3,2]]);
    color(plain_color) polyhedron([[0,0,0],[0,0,0],[0,0,0],[0,0,0]], [[0,1,3,2]]);
    color(plain_color) polyhedron([[0,0,0],[0,0,0],[0,0,0],[0,0,0]], [[0,1,3,2]]);
    color(plain_color) polyhedron([[0,0,0],[0,0,0],[0,0,0],[0,0,0]], [[0,1,3,2]]);
    color(plain_color) polyhedron([[0,0,0],[0,0,0],[0,0,0],[0,0,0]], [[0,1,3,2]]);
    color(plain_color) polyhedron([[0,0,0],[0,0,0],[0,0,0],[0,0,0]], [[0,1,3,2]]);
    color(plain_color) polyhedron([[0,0,0],[0,0,0],[0,0,0],[0,0,0]], [[0,1,3,2]]);
    color(plain_color) polyhedron([[0,0,0],[0,0,0],[0,0,0],[0,0,0]], [[0,1,3,2]]);
    color(plain_color) polyhedron([[0,0,0],[0,0,0],[0,0,0],[0,0,0]], [[0,1,3,2]]);
    color(plain_color) polyhedron([[0,0,0],[0,0,0],[0,0,0],[0,0,0]], [[0,1,3,2]]);
    color(plain_color) polyhedron([[0,0,0],[0,0,0],[0,0,0],[0,0,0]], [[0,1,3,2]]);
    color(plain_color) polyhedron([[0,0,0],[0,0,0],[0,0,0],[0,0,0]], [[0,1,3,2]]);
    color(plain_color) polyhedron([[0,0,0],[0,0,0],[0,0,0],[0,0,0]], [[0,1,3,2]]);
    color(plain_color) polyhedron([[0,0,0],[0,0,0],[0,0,0],[0,0,0]], [[0,1,3,2]]);
    color(plain_color) polyhedron([[0,0,0],[0,0,0],[0,0,0],[0,0,0]], [[0,1,3,2]]);
    color(plain_color) polyhedron([[0,0,0],[0,0,0],[0,0,0],[0,0,0]], [[0,1,3,2]]);
    color(plain_color) polyhedron([[0,0,0],[0,0,0],[0,0,0],[0,0,0]], [[0,1,3,2]]);
    color(plain_color) polyhedron([[0,0,0],[0,0,0],[0,0,0],[0,0,0]], [[0,1,3,2]]);
    color(plain_color) polyhedron([[0,0,0],[0,0,0],[0,0,0],[0,0,0]], [[0,1,3,2]]);
    color(plain_color) polyhedron([[0,0,0],[0,0,0],[0,0,0],[0,0,0]], [[0,1,3,2]]);
    color(plain_color) polyhedron([[0,0,0],[0,0,0],[0,0,0],[0,0,0]], [[0,1,3,2]]);
    color(plain_color) polyhedron([[0,0,0],[0,0,0],[0,0,0],[0,0,0]], [[0,1,3,2]]);
    color(plain_color) polyhedron([[0,0,0],[0,0,0],[0,0,0],[0,0,0]], [[0,1,3,2]]);
    color(plain_color) polyhedron([[0,0,0],[0,0,0],[0,0,0],[0,0,0]], [[0,1,3,2]]);
    color(plain_color) polyhedron([[0,0,0],[0,0,0],[0,0,0],[0,0,0]], [[0,1,3,2]]);
    color(plain_color) polyhedron([[0,0,0],[0,0,0],[0,0,0],[0,0,0]], [[0,1,3,2]]);
    color(plain_color) polyhedron([[0,0,0],[0,0,0],[0,0,0],[0,0,0]], [[0,1,3,2]]);
    color(plain_color) polyhedron([[0,0,0],[0,0,0],[0,0,0],[0,0,0]], [[0,1,3,2]]);
    color(plain_color) polyhedron([[0,0,0],[0,0,0],[0,0,0],[0,0,0]], [[0,1,3,2]]);
    color(plain_color) polyhedron([[0,0,0],[0,0,0],[0,0,0],[0,0,0]], [[0,1,3,2]]);
    color(plain_color) polyhedron([[0,0,0],[0,0,0],[0,0,0],[0,0,0]], [[0,1,3,2]]);
    color(plain_color) polyhedron([[0,0,0],[0,0,0],[0,0,0],[0,0,0]], [[0,1,3,2]]);
    color(plain_color) polyhedron([[0,0,0],[0,0,0],[0,0,0],[0,0,0]], [[0,1,3,2]]);
    color(plain_color) polyhedron([[0,0,0],[0,0,0],[0,0,0],[0,0,0]], [[0,1,3,2]]);
    color(plain_color) polyhedron([[0,0,0],[0,0,0],[0,0,0],[0,0,0]], [[0,1,3,2]]);
    color(plain_color) polyhedron([[0,0,0],[0,0,0],[0,0,0],[0,0,0]], [[0,1,3,2]]);
    color(plain_color) polyhedron([[0,0,0],[0,0,0],[0,0,0],[0,0,0]], [[0,1,3,2]]);
    color(plain_color) polyhedron([[0,0,0],[0,0,0],[0,0,0],[0,0,0]], [[0,1,3,2]]);
    color(plain_color) polyhedron([[0,0,0],[0,0,0],[0,0,0],[0,0,0]], [[0,1,3,2]]);
    color(plain_color) polyhedron([[0,0,0],[0,0,0],[0,0,0],[0,0,0]], [[0,1,3,2]]);
    color(plain_color) polyhedron([[0,0,0],[0,0,0],[0,0,0],[0,0,0]], [[0,1,3,2]]);
    color(plain_color) polyhedron([[0,0,0],[0,0,0],[0,0,0],[0,0,0]], [[0,1,3,2]]);
    color(plain_color) polyhedron([[0,0,0],[0,0,0],[0,0,0],[0,0,0]], [[0,1,3,2]]);
    color(plain_color) polyhedron([[0,0,0],[0,0,0],[0,0,0],[0,0,0]], [[0,1,3,2]]);
    color(plain_color) polyhedron([[0,0,0],[0,0,0],[0,0,0],[0,0,0]], [[0,1,3,2]]);
    color(plain_color) polyhedron([[0,0,0],[0,0,0],[0,0,0],[0,0,0]], [[0,1,3,2]]);
    color(plain_color) polyhedron([[0,0,0],[0,0,0],[0,0,0],[0,0,0]], [[0,1,3,2]]);
    color(plain_color) polyhedron([[0,0,0],[0,0,0],[0,0,0],[0,0,0]], [[0,1,3,2]]);
    color(plain_color) polyhedron([[0,0,0],[0,0,0],[0,0,0],[0,0,0]], [[0,1,3,2]]);
    color(plain_color) polyhedron([[0,0,0],[0,0,0],[0,0,0],[0,0,0]], [[0,1,3,2]]);
    color(plain_color) polyhedron([[0,0,0],[0,0,0],[0,0,0],[0,0,0]], [[0,1,3,2]]);
    color(plain_color) polyhedron([[0,0,0],[0,0,0],[0,0,0],[0,0,0]], [[0,1,3,2]]);
    color(plain_color) polyhedron([[0,0,0],[0,0,0],[0,0,0],[0,0,0]], [[0,1,3,2]]);
    color(plain_color) polyhedron([[0,0,0],[0,0,0],[0,0,0],[0,0,0]], [[0,1,3,2]]);
}
